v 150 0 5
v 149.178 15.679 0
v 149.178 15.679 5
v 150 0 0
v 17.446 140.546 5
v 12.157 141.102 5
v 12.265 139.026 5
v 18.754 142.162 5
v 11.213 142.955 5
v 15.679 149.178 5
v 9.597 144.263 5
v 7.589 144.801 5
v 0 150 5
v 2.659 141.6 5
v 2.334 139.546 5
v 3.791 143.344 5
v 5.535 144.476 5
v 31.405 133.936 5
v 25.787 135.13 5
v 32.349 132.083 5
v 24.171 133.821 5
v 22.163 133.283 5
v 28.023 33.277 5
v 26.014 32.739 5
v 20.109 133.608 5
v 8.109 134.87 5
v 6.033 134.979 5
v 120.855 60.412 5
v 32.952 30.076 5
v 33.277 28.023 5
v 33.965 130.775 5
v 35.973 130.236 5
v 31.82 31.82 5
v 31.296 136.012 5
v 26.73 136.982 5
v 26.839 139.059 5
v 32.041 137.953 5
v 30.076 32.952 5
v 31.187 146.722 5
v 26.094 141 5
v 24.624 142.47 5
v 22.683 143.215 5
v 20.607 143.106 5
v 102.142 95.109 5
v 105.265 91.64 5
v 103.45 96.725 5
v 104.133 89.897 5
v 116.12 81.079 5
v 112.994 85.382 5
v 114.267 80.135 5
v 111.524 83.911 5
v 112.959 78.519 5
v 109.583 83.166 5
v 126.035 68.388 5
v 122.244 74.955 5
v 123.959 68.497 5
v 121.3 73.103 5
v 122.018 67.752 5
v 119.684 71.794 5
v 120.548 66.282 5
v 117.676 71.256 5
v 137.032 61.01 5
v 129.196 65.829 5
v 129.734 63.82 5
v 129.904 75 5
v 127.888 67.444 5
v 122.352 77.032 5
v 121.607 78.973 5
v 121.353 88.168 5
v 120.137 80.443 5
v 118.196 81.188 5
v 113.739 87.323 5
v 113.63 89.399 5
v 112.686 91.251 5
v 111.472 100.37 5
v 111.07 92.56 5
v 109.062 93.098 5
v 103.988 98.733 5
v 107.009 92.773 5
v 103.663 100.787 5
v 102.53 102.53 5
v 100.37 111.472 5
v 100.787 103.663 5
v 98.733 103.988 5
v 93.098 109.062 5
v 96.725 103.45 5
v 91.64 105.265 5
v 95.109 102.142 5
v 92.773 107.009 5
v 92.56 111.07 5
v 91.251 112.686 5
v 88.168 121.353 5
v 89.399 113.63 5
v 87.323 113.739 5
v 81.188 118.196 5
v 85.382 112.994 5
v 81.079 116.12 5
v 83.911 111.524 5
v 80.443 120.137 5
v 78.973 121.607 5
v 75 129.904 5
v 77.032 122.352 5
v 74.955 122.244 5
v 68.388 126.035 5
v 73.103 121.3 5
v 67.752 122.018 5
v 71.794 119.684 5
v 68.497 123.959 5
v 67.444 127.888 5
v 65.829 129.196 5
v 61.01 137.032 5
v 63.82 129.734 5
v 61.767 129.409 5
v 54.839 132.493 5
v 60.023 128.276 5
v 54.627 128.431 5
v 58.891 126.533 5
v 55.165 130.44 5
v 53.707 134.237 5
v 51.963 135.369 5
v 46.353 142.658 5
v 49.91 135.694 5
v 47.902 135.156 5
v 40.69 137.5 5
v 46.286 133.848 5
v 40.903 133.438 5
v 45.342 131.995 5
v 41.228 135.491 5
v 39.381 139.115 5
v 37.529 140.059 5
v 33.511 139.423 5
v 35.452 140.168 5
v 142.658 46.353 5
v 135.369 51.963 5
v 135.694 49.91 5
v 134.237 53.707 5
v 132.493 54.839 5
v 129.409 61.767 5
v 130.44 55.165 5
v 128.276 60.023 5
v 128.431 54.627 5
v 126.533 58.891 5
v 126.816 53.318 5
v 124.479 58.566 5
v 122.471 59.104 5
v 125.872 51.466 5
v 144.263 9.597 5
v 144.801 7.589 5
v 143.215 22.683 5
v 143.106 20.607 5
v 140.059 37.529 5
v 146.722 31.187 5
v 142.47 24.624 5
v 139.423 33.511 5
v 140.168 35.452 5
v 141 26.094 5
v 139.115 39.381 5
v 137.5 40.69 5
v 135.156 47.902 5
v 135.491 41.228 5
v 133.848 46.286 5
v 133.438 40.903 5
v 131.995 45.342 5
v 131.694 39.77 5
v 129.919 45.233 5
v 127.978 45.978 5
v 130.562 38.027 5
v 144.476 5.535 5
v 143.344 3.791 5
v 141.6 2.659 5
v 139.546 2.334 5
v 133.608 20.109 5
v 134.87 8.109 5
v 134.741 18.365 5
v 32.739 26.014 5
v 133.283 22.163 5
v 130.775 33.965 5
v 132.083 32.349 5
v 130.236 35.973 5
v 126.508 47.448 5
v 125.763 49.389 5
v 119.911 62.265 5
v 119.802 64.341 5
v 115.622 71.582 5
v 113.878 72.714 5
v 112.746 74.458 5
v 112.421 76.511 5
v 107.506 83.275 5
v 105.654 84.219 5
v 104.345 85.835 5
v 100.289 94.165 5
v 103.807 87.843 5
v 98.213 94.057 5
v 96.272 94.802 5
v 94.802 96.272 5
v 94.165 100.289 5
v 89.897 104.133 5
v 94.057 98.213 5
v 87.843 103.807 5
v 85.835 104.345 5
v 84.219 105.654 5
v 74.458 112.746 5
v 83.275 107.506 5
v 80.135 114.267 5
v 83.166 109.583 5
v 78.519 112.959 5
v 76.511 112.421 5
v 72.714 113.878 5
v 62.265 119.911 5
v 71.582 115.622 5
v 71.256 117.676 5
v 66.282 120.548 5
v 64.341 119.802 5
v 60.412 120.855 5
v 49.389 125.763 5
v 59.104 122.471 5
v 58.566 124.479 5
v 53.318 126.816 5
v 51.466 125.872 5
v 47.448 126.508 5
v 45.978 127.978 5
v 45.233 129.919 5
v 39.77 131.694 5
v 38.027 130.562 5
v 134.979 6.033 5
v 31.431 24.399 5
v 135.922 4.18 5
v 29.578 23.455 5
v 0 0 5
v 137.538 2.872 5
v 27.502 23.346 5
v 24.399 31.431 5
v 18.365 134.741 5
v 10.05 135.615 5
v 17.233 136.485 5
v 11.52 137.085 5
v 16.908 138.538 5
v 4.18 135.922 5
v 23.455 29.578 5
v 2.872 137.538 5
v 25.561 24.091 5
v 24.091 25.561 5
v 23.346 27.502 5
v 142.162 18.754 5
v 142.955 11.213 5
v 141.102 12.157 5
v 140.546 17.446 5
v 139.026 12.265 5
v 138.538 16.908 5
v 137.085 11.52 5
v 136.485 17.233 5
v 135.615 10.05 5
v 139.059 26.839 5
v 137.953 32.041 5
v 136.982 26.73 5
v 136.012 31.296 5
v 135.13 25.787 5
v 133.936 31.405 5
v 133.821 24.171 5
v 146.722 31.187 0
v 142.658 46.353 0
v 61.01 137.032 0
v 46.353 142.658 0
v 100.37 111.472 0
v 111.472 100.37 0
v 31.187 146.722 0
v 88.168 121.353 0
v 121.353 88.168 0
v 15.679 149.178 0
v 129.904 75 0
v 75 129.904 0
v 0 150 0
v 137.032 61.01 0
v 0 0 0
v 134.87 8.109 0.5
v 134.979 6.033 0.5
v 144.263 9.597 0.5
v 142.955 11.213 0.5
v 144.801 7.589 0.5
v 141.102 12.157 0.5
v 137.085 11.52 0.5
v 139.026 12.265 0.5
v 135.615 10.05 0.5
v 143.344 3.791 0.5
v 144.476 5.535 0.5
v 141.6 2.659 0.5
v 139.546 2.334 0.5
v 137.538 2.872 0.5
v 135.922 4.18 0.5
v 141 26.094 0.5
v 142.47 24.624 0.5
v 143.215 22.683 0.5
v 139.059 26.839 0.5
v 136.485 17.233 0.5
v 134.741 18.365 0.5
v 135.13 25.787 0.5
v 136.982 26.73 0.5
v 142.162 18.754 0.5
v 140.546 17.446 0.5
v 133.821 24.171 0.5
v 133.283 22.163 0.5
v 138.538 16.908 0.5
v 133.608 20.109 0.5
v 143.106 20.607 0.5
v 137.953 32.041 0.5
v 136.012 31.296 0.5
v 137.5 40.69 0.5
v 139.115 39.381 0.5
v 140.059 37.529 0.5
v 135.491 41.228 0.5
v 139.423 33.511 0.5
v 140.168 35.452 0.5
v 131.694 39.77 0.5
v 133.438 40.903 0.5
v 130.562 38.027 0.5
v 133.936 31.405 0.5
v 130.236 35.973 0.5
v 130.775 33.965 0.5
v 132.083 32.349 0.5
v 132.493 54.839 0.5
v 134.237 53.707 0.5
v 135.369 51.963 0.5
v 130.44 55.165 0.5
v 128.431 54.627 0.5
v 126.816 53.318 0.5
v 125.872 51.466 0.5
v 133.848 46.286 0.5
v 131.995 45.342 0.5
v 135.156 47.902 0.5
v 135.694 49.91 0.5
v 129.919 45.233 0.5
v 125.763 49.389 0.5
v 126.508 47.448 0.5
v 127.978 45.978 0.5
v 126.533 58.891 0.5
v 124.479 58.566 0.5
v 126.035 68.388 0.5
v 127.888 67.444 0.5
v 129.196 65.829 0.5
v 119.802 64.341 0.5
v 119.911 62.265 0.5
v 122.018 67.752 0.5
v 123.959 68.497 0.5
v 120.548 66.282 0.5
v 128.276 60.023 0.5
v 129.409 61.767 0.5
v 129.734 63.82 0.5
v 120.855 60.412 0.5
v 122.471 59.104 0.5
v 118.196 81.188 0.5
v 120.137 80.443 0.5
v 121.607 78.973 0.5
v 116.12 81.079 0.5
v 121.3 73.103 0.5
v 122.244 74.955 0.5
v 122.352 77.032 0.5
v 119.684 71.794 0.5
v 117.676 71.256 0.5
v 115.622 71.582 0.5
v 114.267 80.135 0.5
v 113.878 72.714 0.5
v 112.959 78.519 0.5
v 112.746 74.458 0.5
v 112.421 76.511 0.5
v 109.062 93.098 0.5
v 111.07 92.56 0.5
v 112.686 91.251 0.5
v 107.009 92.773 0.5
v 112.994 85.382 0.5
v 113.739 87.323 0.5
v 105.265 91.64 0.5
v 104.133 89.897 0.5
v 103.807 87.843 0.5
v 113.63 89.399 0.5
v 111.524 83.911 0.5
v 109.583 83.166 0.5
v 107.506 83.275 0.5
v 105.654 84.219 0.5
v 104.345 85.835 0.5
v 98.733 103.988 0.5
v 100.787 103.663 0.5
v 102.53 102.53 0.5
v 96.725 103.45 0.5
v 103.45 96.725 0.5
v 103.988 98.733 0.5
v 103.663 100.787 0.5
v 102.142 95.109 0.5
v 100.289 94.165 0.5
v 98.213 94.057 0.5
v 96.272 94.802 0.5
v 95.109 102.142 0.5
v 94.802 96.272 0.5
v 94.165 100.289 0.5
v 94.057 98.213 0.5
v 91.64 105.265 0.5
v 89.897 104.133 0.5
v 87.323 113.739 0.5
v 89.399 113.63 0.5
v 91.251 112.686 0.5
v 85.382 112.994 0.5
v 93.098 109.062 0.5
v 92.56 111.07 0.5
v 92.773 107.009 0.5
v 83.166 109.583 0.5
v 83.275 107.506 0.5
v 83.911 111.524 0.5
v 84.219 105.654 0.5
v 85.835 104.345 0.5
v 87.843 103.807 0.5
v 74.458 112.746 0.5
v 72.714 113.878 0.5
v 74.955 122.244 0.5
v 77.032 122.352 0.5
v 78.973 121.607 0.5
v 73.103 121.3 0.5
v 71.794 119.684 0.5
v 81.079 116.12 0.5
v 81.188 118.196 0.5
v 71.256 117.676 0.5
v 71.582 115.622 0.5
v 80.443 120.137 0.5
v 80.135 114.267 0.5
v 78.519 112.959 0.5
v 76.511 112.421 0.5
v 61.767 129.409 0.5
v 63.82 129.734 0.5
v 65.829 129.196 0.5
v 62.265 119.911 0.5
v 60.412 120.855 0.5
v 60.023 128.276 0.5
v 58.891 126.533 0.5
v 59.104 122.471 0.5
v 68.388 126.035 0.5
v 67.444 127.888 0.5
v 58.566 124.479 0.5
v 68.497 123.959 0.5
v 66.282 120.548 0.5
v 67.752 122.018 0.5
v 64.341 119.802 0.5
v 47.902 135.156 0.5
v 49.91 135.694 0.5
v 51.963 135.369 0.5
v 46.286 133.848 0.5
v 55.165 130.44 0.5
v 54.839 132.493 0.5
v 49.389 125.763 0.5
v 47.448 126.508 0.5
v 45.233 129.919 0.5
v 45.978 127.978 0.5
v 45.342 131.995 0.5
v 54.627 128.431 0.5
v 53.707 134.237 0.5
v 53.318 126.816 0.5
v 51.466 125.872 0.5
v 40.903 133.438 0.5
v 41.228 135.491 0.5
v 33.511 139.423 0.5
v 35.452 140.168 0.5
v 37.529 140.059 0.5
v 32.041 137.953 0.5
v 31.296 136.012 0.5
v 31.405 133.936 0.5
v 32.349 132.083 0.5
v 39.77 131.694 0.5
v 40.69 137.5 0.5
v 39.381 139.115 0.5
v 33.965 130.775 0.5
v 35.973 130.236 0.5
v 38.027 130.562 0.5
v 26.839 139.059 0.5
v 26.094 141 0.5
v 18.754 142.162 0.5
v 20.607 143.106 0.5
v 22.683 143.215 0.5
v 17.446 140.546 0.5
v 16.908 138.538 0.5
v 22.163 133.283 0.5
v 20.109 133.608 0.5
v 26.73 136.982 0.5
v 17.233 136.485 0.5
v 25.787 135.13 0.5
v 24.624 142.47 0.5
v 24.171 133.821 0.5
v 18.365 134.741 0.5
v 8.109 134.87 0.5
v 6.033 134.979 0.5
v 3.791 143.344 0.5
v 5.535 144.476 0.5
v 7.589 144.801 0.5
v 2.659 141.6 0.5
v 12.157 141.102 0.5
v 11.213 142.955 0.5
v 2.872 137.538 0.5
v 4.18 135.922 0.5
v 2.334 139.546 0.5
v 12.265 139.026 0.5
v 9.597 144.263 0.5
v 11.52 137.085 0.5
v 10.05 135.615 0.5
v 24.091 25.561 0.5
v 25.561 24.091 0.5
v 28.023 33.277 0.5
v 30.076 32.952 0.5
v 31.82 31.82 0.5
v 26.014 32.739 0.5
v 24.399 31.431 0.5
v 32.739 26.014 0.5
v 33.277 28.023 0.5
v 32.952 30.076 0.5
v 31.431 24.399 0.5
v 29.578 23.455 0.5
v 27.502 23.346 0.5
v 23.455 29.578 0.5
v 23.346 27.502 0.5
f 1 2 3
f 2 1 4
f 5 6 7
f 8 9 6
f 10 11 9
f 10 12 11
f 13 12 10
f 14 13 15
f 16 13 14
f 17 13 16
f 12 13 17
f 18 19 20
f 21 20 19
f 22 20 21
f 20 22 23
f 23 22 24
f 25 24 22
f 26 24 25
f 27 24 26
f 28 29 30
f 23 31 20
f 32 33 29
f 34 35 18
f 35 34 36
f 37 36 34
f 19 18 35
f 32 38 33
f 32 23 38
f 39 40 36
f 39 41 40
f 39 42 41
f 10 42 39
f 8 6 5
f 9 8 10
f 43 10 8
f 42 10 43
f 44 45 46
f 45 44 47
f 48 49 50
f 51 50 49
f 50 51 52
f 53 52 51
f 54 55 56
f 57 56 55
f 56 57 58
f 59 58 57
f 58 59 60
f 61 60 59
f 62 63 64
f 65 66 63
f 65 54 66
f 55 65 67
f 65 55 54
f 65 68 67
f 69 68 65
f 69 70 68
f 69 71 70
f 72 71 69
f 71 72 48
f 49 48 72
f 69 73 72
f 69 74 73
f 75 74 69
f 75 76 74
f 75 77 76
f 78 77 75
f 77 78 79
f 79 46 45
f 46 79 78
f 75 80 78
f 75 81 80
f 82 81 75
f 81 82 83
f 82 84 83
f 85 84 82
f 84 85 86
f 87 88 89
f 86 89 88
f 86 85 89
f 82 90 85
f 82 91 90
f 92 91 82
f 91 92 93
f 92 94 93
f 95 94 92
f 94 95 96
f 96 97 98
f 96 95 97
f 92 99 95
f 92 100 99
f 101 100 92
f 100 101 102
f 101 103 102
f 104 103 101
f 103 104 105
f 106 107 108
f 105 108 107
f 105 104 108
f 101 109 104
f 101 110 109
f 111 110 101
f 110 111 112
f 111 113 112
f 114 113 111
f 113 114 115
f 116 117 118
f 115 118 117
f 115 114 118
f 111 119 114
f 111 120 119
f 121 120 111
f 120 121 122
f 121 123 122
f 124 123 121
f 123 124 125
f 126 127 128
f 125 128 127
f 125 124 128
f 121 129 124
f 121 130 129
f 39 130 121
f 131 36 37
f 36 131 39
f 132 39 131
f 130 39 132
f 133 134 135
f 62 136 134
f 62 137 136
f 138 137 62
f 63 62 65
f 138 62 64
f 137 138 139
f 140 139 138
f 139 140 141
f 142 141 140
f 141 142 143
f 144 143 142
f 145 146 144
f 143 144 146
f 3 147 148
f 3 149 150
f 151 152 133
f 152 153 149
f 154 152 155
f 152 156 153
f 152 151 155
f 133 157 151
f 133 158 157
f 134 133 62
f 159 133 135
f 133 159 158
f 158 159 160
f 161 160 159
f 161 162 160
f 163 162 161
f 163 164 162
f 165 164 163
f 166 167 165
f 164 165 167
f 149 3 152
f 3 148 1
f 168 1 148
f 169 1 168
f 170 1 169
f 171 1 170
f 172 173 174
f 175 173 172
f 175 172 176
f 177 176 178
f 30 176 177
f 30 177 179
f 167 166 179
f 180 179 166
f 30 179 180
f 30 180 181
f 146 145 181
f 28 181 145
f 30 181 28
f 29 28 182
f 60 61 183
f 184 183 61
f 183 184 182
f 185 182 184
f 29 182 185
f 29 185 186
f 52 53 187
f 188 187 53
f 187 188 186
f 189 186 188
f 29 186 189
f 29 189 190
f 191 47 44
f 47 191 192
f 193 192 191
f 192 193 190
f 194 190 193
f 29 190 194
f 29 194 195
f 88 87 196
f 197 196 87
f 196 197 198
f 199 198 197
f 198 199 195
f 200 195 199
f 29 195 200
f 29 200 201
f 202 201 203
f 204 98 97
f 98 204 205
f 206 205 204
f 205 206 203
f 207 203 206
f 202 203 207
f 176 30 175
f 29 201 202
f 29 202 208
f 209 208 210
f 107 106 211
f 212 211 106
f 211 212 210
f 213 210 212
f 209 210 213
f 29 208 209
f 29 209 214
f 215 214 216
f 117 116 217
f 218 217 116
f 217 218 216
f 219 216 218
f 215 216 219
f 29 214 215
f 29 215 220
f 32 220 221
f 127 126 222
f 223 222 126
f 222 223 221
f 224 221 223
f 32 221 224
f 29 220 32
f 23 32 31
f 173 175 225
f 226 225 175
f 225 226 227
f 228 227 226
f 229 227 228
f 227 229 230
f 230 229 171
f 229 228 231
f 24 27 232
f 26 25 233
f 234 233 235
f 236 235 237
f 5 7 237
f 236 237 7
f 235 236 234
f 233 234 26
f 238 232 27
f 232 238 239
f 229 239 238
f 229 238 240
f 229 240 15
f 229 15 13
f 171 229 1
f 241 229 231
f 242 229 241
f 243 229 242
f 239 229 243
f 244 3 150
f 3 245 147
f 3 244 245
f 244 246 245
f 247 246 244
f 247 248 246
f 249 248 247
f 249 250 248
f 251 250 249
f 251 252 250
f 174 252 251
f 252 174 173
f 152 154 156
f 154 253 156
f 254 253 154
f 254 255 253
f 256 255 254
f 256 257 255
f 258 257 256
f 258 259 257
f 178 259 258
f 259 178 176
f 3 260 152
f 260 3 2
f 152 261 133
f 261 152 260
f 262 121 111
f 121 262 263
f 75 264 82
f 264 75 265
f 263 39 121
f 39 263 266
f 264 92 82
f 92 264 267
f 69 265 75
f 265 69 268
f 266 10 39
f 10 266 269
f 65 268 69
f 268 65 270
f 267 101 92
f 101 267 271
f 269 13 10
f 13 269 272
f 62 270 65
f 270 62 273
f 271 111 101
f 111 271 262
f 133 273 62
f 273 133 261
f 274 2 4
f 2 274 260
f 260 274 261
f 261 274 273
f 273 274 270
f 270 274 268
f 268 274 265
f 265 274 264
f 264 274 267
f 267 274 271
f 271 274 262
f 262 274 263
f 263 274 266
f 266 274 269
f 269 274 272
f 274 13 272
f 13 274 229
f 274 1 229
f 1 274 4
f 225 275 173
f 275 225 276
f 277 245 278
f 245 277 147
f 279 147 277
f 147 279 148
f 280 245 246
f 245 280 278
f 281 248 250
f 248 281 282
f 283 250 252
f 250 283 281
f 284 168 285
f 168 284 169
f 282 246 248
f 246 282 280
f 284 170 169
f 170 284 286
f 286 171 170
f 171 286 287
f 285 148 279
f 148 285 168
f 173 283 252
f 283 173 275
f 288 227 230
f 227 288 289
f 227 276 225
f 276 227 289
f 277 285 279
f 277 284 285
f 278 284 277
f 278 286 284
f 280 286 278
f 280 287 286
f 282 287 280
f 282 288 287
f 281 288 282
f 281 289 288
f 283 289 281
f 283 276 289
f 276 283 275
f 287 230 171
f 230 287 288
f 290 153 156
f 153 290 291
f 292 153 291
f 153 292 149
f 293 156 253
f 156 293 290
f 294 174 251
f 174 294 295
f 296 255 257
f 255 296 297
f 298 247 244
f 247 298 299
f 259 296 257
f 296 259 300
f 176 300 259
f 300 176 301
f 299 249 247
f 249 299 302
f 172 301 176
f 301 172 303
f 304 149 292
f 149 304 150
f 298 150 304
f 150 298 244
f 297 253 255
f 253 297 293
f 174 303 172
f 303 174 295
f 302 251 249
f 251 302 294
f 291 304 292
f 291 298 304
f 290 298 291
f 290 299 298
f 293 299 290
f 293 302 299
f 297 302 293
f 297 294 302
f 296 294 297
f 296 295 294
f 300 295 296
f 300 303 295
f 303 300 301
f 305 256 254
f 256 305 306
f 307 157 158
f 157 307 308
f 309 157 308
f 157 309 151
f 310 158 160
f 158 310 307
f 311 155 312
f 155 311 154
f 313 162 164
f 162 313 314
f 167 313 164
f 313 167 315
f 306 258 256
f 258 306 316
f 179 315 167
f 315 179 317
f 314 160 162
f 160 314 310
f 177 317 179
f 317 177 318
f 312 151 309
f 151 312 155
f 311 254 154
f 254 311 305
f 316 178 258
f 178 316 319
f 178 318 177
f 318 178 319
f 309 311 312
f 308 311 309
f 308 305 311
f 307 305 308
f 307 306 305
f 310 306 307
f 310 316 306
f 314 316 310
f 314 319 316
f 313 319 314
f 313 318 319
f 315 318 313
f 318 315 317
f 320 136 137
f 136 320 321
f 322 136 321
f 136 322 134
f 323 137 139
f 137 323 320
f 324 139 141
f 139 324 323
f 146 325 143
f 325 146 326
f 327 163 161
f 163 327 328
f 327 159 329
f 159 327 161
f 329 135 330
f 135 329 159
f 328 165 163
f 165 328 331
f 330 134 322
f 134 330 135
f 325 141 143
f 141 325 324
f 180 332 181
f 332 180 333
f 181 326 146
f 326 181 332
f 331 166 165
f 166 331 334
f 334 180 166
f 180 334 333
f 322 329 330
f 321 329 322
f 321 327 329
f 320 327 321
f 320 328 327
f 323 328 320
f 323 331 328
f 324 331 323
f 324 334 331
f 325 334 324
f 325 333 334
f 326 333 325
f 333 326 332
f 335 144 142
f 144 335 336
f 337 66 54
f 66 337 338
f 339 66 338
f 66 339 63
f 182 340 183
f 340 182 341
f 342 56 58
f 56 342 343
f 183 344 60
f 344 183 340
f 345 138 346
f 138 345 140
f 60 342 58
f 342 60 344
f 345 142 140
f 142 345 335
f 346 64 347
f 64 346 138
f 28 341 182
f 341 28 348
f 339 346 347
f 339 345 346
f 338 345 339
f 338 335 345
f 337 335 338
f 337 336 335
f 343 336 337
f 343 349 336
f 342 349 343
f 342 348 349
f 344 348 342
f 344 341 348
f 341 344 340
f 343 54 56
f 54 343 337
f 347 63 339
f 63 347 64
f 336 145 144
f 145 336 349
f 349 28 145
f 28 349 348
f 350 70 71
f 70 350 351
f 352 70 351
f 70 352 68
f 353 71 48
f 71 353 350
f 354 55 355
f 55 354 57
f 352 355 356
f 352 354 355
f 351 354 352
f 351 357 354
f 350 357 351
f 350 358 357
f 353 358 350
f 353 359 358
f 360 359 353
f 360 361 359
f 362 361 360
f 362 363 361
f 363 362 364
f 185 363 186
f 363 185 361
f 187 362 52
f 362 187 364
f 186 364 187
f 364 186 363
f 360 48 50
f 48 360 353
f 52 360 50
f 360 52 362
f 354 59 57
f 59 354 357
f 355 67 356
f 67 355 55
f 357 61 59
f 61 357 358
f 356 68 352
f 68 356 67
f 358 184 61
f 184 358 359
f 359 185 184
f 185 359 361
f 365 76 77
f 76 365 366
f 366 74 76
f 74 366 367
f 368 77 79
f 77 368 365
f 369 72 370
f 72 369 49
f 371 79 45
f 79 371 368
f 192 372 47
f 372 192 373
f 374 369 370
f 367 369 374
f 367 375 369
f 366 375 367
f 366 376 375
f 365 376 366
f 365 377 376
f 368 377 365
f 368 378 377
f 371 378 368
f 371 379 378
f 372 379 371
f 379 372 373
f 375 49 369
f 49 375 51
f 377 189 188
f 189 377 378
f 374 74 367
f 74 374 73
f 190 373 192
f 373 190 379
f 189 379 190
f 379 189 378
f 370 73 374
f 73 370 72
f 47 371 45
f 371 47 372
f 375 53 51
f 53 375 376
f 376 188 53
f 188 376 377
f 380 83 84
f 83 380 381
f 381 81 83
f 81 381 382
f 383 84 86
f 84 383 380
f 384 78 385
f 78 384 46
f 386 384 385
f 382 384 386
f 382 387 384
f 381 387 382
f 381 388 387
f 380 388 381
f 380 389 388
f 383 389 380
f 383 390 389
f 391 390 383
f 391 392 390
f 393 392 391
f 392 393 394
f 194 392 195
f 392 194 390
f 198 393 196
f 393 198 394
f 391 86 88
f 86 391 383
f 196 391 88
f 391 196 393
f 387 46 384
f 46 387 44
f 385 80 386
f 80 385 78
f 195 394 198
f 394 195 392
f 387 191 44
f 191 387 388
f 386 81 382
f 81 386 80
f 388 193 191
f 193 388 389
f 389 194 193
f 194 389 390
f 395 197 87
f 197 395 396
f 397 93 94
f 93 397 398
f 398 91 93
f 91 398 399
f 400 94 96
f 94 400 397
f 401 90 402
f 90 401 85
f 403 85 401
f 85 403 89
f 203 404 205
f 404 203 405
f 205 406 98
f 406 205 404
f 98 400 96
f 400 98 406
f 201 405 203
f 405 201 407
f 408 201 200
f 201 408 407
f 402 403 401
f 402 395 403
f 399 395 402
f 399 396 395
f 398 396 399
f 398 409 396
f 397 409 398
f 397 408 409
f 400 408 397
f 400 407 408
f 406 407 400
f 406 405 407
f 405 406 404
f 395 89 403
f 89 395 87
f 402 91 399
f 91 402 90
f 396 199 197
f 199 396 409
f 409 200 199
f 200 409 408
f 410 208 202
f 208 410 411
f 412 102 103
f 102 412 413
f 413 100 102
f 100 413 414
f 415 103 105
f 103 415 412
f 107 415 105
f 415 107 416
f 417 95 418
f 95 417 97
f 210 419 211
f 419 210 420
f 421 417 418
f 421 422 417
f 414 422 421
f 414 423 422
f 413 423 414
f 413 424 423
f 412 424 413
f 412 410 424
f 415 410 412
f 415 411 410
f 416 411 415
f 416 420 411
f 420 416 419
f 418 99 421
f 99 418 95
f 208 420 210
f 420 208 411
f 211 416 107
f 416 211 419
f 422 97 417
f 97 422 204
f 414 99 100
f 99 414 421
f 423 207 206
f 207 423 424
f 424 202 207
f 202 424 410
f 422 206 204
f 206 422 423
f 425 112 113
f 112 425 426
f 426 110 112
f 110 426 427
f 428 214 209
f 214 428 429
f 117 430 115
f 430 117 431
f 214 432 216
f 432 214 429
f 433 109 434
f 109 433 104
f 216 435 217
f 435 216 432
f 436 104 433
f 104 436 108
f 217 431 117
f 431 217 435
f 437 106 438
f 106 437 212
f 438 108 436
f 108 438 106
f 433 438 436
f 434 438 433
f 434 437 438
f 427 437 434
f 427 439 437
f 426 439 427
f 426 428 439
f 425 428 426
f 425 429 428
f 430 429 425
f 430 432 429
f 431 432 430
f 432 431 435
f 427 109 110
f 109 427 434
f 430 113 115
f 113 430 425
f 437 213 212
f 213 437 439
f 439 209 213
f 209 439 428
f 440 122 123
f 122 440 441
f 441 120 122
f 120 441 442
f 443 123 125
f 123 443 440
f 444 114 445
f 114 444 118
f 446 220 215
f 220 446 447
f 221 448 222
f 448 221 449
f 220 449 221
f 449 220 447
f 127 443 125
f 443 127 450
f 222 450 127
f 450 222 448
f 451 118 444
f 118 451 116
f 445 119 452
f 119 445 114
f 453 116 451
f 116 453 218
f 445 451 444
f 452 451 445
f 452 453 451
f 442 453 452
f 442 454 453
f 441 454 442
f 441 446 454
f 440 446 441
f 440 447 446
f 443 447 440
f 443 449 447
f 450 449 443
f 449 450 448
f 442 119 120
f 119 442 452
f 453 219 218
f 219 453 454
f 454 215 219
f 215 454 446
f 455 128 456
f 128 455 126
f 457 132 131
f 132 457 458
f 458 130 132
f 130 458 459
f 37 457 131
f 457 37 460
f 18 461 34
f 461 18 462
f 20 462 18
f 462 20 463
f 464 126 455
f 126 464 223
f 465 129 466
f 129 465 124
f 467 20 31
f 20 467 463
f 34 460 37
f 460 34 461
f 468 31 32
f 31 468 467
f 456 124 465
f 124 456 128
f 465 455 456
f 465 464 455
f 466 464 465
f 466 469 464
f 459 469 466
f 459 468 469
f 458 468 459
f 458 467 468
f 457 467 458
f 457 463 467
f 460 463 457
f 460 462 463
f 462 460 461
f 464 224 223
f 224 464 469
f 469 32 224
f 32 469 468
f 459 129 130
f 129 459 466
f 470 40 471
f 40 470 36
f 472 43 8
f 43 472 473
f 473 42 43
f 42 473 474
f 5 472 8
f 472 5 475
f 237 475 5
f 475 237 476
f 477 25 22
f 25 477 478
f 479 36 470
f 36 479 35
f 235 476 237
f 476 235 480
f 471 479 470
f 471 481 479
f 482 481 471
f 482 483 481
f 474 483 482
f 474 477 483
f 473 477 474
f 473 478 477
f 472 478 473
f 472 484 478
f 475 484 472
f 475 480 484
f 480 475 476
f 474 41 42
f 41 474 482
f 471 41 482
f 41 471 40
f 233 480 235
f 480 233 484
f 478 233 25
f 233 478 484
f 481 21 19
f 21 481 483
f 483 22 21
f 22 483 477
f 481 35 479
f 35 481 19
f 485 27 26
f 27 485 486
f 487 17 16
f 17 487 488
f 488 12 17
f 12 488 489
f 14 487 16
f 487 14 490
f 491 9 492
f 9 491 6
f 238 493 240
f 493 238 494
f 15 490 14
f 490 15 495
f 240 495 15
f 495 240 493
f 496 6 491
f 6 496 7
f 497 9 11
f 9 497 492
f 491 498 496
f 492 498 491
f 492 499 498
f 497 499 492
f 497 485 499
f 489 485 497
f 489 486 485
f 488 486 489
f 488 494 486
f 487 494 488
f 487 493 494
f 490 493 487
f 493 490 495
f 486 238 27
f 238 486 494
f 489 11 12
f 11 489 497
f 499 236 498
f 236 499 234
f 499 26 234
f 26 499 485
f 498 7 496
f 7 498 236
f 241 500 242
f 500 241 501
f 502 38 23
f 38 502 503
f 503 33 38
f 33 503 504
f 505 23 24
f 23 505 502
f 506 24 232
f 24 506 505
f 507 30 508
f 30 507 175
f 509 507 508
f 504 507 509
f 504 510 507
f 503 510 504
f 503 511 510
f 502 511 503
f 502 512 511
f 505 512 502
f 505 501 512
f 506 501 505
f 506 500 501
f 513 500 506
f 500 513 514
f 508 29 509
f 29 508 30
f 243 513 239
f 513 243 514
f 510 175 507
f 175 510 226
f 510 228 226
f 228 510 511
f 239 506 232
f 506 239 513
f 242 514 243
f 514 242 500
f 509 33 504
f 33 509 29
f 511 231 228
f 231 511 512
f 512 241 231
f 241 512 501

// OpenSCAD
difference()
{
    //cylinder(h=5, r = 150, $fn=60);

    rotate([0,0,180]) arc(0, 150, 5, 90);
    
    segments = 15;
    segment_rotation_const = 360 / (segments * 4);
    
    for(a = [0:segments])
    {
        //  Rotate half const to enable splitting into four pizza slices
        rotation_value = (a * segment_rotation_const) + 
            (segment_rotation_const / 2);
        
        rotate([0,0,rotation_value]) 
            translate([140,0,0.5]) cylinder(h = 5, r = 5, $fn=15);
    }
      
        
        rotate([0,0,45]) 
            translate([40,0,0.5]) cylinder(h = 5, r = 5, $fn=15);
}


/* 
 * Excerpt from... 
 * 
 * Parametric Encoder Wheel 
 *
 * by Alex Franke (codecreations), March 2012
 * http://www.theFrankes.com
 * 
 * Licenced under Creative Commons Attribution - Non-Commercial - Share Alike 3.0 
*/
module arc(innerradius, radius, height, degrees ) 
{
    $fn=60;
    
    render() 
    {
            if( degrees > 180 )
            {
                difference()
                {
                  difference()
                    {
                        cylinder( r=radius, h=height );
                        cylinder( r=innerradius*1.0001, h=height );
                    }
                    rotate([0,0,-degrees]) arc( innerradius,radius*1.0001, height*1.0001,  360-degrees) ;                    
                }
            }
            else
            {        
                difference() 
                {    
                    // Outer ring
                    rotate_extrude()
                        translate([innerradius, 0, 0])
                            square([radius - innerradius,height]);
                
                    // Cut half off
                    translate([0,-(radius+1),-.5]) 
                        cube ([radius+1,(radius+1)*2,height+1]);
           
                    // Cover the other half as necessary
                    rotate([0,0,180-degrees])
                    translate([0,-(radius+1),-.5]) 
                        cube ([radius+1,(radius+1)*2,height+1]);
                }
            }
        
    }
}
